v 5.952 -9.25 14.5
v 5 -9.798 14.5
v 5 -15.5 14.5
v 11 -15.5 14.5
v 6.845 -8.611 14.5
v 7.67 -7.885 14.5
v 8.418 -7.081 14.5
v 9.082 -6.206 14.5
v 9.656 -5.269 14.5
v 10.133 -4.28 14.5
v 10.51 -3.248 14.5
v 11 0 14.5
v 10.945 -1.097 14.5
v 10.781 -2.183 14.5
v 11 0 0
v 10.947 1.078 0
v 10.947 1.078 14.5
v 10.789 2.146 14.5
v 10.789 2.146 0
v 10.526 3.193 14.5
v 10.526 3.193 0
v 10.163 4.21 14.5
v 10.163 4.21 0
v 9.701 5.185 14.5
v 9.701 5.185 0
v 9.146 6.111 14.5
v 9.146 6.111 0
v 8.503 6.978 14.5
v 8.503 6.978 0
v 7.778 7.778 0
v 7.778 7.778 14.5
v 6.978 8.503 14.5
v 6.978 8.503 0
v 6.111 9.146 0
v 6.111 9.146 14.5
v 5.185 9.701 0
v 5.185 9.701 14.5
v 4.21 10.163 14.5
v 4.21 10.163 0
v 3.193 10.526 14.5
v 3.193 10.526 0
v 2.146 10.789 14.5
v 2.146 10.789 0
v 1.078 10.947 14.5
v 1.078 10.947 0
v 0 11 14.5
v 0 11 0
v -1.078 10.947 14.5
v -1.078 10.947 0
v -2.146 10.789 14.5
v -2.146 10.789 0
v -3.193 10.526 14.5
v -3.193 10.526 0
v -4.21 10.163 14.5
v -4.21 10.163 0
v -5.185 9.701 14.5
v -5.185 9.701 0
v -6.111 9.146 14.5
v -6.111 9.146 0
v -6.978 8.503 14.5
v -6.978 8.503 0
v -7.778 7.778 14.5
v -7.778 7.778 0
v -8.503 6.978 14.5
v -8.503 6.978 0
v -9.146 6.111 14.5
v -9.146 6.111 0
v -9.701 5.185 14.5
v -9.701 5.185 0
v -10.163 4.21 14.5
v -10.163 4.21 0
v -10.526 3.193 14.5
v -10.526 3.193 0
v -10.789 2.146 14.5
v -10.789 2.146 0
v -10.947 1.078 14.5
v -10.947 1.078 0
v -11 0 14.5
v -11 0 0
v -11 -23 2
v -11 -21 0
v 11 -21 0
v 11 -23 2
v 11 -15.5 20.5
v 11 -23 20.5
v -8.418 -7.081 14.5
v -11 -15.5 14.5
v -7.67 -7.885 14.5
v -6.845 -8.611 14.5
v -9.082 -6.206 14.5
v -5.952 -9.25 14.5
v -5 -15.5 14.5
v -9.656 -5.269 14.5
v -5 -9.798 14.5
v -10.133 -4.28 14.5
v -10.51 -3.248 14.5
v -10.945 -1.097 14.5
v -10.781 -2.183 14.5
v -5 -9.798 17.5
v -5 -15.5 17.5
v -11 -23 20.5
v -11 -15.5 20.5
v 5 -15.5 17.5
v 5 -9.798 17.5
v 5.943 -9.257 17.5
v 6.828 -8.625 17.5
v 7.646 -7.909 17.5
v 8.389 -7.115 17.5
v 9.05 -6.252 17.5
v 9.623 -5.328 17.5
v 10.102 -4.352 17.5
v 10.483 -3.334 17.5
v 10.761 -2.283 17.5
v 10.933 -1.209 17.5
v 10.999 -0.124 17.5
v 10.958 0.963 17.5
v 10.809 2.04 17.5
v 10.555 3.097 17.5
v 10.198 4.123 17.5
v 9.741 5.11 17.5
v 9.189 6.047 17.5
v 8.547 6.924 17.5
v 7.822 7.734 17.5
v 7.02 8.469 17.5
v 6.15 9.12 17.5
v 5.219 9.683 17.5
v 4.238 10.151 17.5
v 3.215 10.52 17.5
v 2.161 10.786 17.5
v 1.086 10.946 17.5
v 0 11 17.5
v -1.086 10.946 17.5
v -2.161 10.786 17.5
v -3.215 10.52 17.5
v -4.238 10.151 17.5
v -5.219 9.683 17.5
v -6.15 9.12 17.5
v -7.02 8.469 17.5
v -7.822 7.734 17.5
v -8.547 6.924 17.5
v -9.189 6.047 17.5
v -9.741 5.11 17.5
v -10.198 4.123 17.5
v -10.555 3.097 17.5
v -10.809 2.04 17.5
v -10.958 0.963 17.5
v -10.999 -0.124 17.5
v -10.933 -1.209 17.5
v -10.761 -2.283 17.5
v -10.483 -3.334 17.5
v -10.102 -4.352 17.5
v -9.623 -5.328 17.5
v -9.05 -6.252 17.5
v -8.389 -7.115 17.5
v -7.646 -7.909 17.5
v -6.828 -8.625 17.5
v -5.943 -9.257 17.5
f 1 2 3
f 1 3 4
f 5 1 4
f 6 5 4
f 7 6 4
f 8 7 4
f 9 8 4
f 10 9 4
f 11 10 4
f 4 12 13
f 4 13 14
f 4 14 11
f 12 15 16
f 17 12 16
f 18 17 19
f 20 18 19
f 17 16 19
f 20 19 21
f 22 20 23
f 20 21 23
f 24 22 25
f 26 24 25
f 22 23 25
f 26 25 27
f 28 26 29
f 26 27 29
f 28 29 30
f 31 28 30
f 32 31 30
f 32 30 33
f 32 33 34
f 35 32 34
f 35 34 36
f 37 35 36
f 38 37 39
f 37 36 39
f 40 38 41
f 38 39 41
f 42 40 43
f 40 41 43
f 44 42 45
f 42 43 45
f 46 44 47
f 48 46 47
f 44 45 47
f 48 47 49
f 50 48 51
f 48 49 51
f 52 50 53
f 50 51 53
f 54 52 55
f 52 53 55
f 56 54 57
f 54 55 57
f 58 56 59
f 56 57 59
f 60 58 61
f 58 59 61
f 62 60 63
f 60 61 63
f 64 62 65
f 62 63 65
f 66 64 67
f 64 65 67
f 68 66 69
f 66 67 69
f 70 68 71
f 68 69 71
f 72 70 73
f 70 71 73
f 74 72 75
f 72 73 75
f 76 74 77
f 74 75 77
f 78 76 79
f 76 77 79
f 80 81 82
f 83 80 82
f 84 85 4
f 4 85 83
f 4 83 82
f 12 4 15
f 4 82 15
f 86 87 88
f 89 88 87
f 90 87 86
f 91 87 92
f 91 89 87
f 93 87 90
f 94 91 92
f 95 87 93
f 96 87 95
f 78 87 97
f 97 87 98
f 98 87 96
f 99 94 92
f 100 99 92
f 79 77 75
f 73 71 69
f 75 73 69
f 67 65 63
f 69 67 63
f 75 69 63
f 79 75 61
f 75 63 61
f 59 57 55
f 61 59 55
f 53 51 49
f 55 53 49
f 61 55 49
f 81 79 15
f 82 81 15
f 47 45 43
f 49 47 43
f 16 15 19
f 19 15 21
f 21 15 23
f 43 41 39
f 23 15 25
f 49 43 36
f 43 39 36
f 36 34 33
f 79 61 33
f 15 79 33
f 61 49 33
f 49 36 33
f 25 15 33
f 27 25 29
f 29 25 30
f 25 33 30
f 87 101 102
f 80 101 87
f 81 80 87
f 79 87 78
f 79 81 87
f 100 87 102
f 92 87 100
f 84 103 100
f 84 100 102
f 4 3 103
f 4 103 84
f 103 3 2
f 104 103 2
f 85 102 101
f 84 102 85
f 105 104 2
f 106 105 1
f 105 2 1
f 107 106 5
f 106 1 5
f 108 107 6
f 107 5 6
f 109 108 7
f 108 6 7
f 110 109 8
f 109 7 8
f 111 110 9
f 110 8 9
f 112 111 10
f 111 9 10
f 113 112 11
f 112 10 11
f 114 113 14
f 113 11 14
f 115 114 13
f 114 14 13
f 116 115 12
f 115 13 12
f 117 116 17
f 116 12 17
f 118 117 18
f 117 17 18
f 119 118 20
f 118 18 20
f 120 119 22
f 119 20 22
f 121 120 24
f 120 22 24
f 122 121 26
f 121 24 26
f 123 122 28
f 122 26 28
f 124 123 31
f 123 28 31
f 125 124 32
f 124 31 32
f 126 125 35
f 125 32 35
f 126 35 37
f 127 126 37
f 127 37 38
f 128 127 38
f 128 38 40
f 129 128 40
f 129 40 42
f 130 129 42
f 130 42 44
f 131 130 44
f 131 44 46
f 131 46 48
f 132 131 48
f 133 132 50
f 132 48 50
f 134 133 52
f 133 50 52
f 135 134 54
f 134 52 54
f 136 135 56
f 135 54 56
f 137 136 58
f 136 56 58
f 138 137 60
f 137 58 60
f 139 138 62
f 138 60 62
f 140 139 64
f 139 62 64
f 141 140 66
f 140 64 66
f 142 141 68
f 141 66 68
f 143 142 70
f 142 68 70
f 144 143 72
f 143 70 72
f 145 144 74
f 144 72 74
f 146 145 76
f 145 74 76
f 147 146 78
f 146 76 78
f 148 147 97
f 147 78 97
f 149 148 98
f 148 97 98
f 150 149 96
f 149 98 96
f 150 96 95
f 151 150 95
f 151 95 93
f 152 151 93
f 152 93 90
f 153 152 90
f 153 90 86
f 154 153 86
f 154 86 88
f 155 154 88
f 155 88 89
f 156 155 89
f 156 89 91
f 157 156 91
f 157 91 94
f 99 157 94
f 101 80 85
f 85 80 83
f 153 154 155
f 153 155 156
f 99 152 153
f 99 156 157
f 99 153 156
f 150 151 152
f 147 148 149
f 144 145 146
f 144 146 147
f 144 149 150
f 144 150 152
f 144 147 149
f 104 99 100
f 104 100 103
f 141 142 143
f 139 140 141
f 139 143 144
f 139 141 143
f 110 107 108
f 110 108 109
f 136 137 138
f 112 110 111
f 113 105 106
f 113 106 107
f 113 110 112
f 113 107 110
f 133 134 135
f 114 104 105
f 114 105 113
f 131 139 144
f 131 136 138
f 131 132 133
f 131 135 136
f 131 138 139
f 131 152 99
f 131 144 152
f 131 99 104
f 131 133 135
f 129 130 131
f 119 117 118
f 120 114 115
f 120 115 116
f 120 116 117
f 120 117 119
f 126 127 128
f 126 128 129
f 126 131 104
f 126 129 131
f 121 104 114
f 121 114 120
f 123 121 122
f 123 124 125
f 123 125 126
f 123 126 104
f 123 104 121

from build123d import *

# Parameters (mm, degrees)
BOSS_EXTRU_1_DEPTH = 14.5
CHANFREIN1_SIZE    = 2
ESQUISSE2_W        = 22
ESQUISSE2_H        = 7.5
BOSS_EXTRU_2_DEPTH = 6
BOSS_EXTRU_3_DEPTH = 3


with BuildPart() as part:
    # Esquisse1 → Boss.-Extru.1 (new body)
    with BuildSketch(Plane.XY):
        with BuildLine():
            Line((-11, 0), (-11, -23))
            Line((-11, -23), (11, -23))
            Line((11, -23), (11, 0))
            ThreePointArc((11, 0), (0, 11), (-11, 0))
        make_face()
    extrude(amount=BOSS_EXTRU_1_DEPTH)

    # Chanfrein1
    chanfrein1_edges = [part.edges().sort_by_distance(p)[0] for p in [
        (0, -23, 0),
    ]]
    chamfer(chanfrein1_edges, length=CHANFREIN1_SIZE)

    # Esquisse2 → Boss.-Extru.2 (add)
    with BuildSketch(Plane.XY.offset(14.5)):
        with Locations((0, -19.25)):
            Rectangle(ESQUISSE2_W, ESQUISSE2_H)
    extrude(amount=BOSS_EXTRU_2_DEPTH)

    # Esquisse3 → Boss.-Extru.3 (add)
    with BuildSketch(Plane.XY.offset(14.5)):
        with BuildLine():
            Line((-5, -9.797958971), (-5, -15.5))
            Line((-5, -15.5), (5, -15.5))
            Line((5, -15.5), (5, -9.797958971))
            ThreePointArc((5, -9.797958971), (0, 11), (-5, -9.797958971))
        make_face()
    extrude(amount=BOSS_EXTRU_3_DEPTH)


solid = part.part
